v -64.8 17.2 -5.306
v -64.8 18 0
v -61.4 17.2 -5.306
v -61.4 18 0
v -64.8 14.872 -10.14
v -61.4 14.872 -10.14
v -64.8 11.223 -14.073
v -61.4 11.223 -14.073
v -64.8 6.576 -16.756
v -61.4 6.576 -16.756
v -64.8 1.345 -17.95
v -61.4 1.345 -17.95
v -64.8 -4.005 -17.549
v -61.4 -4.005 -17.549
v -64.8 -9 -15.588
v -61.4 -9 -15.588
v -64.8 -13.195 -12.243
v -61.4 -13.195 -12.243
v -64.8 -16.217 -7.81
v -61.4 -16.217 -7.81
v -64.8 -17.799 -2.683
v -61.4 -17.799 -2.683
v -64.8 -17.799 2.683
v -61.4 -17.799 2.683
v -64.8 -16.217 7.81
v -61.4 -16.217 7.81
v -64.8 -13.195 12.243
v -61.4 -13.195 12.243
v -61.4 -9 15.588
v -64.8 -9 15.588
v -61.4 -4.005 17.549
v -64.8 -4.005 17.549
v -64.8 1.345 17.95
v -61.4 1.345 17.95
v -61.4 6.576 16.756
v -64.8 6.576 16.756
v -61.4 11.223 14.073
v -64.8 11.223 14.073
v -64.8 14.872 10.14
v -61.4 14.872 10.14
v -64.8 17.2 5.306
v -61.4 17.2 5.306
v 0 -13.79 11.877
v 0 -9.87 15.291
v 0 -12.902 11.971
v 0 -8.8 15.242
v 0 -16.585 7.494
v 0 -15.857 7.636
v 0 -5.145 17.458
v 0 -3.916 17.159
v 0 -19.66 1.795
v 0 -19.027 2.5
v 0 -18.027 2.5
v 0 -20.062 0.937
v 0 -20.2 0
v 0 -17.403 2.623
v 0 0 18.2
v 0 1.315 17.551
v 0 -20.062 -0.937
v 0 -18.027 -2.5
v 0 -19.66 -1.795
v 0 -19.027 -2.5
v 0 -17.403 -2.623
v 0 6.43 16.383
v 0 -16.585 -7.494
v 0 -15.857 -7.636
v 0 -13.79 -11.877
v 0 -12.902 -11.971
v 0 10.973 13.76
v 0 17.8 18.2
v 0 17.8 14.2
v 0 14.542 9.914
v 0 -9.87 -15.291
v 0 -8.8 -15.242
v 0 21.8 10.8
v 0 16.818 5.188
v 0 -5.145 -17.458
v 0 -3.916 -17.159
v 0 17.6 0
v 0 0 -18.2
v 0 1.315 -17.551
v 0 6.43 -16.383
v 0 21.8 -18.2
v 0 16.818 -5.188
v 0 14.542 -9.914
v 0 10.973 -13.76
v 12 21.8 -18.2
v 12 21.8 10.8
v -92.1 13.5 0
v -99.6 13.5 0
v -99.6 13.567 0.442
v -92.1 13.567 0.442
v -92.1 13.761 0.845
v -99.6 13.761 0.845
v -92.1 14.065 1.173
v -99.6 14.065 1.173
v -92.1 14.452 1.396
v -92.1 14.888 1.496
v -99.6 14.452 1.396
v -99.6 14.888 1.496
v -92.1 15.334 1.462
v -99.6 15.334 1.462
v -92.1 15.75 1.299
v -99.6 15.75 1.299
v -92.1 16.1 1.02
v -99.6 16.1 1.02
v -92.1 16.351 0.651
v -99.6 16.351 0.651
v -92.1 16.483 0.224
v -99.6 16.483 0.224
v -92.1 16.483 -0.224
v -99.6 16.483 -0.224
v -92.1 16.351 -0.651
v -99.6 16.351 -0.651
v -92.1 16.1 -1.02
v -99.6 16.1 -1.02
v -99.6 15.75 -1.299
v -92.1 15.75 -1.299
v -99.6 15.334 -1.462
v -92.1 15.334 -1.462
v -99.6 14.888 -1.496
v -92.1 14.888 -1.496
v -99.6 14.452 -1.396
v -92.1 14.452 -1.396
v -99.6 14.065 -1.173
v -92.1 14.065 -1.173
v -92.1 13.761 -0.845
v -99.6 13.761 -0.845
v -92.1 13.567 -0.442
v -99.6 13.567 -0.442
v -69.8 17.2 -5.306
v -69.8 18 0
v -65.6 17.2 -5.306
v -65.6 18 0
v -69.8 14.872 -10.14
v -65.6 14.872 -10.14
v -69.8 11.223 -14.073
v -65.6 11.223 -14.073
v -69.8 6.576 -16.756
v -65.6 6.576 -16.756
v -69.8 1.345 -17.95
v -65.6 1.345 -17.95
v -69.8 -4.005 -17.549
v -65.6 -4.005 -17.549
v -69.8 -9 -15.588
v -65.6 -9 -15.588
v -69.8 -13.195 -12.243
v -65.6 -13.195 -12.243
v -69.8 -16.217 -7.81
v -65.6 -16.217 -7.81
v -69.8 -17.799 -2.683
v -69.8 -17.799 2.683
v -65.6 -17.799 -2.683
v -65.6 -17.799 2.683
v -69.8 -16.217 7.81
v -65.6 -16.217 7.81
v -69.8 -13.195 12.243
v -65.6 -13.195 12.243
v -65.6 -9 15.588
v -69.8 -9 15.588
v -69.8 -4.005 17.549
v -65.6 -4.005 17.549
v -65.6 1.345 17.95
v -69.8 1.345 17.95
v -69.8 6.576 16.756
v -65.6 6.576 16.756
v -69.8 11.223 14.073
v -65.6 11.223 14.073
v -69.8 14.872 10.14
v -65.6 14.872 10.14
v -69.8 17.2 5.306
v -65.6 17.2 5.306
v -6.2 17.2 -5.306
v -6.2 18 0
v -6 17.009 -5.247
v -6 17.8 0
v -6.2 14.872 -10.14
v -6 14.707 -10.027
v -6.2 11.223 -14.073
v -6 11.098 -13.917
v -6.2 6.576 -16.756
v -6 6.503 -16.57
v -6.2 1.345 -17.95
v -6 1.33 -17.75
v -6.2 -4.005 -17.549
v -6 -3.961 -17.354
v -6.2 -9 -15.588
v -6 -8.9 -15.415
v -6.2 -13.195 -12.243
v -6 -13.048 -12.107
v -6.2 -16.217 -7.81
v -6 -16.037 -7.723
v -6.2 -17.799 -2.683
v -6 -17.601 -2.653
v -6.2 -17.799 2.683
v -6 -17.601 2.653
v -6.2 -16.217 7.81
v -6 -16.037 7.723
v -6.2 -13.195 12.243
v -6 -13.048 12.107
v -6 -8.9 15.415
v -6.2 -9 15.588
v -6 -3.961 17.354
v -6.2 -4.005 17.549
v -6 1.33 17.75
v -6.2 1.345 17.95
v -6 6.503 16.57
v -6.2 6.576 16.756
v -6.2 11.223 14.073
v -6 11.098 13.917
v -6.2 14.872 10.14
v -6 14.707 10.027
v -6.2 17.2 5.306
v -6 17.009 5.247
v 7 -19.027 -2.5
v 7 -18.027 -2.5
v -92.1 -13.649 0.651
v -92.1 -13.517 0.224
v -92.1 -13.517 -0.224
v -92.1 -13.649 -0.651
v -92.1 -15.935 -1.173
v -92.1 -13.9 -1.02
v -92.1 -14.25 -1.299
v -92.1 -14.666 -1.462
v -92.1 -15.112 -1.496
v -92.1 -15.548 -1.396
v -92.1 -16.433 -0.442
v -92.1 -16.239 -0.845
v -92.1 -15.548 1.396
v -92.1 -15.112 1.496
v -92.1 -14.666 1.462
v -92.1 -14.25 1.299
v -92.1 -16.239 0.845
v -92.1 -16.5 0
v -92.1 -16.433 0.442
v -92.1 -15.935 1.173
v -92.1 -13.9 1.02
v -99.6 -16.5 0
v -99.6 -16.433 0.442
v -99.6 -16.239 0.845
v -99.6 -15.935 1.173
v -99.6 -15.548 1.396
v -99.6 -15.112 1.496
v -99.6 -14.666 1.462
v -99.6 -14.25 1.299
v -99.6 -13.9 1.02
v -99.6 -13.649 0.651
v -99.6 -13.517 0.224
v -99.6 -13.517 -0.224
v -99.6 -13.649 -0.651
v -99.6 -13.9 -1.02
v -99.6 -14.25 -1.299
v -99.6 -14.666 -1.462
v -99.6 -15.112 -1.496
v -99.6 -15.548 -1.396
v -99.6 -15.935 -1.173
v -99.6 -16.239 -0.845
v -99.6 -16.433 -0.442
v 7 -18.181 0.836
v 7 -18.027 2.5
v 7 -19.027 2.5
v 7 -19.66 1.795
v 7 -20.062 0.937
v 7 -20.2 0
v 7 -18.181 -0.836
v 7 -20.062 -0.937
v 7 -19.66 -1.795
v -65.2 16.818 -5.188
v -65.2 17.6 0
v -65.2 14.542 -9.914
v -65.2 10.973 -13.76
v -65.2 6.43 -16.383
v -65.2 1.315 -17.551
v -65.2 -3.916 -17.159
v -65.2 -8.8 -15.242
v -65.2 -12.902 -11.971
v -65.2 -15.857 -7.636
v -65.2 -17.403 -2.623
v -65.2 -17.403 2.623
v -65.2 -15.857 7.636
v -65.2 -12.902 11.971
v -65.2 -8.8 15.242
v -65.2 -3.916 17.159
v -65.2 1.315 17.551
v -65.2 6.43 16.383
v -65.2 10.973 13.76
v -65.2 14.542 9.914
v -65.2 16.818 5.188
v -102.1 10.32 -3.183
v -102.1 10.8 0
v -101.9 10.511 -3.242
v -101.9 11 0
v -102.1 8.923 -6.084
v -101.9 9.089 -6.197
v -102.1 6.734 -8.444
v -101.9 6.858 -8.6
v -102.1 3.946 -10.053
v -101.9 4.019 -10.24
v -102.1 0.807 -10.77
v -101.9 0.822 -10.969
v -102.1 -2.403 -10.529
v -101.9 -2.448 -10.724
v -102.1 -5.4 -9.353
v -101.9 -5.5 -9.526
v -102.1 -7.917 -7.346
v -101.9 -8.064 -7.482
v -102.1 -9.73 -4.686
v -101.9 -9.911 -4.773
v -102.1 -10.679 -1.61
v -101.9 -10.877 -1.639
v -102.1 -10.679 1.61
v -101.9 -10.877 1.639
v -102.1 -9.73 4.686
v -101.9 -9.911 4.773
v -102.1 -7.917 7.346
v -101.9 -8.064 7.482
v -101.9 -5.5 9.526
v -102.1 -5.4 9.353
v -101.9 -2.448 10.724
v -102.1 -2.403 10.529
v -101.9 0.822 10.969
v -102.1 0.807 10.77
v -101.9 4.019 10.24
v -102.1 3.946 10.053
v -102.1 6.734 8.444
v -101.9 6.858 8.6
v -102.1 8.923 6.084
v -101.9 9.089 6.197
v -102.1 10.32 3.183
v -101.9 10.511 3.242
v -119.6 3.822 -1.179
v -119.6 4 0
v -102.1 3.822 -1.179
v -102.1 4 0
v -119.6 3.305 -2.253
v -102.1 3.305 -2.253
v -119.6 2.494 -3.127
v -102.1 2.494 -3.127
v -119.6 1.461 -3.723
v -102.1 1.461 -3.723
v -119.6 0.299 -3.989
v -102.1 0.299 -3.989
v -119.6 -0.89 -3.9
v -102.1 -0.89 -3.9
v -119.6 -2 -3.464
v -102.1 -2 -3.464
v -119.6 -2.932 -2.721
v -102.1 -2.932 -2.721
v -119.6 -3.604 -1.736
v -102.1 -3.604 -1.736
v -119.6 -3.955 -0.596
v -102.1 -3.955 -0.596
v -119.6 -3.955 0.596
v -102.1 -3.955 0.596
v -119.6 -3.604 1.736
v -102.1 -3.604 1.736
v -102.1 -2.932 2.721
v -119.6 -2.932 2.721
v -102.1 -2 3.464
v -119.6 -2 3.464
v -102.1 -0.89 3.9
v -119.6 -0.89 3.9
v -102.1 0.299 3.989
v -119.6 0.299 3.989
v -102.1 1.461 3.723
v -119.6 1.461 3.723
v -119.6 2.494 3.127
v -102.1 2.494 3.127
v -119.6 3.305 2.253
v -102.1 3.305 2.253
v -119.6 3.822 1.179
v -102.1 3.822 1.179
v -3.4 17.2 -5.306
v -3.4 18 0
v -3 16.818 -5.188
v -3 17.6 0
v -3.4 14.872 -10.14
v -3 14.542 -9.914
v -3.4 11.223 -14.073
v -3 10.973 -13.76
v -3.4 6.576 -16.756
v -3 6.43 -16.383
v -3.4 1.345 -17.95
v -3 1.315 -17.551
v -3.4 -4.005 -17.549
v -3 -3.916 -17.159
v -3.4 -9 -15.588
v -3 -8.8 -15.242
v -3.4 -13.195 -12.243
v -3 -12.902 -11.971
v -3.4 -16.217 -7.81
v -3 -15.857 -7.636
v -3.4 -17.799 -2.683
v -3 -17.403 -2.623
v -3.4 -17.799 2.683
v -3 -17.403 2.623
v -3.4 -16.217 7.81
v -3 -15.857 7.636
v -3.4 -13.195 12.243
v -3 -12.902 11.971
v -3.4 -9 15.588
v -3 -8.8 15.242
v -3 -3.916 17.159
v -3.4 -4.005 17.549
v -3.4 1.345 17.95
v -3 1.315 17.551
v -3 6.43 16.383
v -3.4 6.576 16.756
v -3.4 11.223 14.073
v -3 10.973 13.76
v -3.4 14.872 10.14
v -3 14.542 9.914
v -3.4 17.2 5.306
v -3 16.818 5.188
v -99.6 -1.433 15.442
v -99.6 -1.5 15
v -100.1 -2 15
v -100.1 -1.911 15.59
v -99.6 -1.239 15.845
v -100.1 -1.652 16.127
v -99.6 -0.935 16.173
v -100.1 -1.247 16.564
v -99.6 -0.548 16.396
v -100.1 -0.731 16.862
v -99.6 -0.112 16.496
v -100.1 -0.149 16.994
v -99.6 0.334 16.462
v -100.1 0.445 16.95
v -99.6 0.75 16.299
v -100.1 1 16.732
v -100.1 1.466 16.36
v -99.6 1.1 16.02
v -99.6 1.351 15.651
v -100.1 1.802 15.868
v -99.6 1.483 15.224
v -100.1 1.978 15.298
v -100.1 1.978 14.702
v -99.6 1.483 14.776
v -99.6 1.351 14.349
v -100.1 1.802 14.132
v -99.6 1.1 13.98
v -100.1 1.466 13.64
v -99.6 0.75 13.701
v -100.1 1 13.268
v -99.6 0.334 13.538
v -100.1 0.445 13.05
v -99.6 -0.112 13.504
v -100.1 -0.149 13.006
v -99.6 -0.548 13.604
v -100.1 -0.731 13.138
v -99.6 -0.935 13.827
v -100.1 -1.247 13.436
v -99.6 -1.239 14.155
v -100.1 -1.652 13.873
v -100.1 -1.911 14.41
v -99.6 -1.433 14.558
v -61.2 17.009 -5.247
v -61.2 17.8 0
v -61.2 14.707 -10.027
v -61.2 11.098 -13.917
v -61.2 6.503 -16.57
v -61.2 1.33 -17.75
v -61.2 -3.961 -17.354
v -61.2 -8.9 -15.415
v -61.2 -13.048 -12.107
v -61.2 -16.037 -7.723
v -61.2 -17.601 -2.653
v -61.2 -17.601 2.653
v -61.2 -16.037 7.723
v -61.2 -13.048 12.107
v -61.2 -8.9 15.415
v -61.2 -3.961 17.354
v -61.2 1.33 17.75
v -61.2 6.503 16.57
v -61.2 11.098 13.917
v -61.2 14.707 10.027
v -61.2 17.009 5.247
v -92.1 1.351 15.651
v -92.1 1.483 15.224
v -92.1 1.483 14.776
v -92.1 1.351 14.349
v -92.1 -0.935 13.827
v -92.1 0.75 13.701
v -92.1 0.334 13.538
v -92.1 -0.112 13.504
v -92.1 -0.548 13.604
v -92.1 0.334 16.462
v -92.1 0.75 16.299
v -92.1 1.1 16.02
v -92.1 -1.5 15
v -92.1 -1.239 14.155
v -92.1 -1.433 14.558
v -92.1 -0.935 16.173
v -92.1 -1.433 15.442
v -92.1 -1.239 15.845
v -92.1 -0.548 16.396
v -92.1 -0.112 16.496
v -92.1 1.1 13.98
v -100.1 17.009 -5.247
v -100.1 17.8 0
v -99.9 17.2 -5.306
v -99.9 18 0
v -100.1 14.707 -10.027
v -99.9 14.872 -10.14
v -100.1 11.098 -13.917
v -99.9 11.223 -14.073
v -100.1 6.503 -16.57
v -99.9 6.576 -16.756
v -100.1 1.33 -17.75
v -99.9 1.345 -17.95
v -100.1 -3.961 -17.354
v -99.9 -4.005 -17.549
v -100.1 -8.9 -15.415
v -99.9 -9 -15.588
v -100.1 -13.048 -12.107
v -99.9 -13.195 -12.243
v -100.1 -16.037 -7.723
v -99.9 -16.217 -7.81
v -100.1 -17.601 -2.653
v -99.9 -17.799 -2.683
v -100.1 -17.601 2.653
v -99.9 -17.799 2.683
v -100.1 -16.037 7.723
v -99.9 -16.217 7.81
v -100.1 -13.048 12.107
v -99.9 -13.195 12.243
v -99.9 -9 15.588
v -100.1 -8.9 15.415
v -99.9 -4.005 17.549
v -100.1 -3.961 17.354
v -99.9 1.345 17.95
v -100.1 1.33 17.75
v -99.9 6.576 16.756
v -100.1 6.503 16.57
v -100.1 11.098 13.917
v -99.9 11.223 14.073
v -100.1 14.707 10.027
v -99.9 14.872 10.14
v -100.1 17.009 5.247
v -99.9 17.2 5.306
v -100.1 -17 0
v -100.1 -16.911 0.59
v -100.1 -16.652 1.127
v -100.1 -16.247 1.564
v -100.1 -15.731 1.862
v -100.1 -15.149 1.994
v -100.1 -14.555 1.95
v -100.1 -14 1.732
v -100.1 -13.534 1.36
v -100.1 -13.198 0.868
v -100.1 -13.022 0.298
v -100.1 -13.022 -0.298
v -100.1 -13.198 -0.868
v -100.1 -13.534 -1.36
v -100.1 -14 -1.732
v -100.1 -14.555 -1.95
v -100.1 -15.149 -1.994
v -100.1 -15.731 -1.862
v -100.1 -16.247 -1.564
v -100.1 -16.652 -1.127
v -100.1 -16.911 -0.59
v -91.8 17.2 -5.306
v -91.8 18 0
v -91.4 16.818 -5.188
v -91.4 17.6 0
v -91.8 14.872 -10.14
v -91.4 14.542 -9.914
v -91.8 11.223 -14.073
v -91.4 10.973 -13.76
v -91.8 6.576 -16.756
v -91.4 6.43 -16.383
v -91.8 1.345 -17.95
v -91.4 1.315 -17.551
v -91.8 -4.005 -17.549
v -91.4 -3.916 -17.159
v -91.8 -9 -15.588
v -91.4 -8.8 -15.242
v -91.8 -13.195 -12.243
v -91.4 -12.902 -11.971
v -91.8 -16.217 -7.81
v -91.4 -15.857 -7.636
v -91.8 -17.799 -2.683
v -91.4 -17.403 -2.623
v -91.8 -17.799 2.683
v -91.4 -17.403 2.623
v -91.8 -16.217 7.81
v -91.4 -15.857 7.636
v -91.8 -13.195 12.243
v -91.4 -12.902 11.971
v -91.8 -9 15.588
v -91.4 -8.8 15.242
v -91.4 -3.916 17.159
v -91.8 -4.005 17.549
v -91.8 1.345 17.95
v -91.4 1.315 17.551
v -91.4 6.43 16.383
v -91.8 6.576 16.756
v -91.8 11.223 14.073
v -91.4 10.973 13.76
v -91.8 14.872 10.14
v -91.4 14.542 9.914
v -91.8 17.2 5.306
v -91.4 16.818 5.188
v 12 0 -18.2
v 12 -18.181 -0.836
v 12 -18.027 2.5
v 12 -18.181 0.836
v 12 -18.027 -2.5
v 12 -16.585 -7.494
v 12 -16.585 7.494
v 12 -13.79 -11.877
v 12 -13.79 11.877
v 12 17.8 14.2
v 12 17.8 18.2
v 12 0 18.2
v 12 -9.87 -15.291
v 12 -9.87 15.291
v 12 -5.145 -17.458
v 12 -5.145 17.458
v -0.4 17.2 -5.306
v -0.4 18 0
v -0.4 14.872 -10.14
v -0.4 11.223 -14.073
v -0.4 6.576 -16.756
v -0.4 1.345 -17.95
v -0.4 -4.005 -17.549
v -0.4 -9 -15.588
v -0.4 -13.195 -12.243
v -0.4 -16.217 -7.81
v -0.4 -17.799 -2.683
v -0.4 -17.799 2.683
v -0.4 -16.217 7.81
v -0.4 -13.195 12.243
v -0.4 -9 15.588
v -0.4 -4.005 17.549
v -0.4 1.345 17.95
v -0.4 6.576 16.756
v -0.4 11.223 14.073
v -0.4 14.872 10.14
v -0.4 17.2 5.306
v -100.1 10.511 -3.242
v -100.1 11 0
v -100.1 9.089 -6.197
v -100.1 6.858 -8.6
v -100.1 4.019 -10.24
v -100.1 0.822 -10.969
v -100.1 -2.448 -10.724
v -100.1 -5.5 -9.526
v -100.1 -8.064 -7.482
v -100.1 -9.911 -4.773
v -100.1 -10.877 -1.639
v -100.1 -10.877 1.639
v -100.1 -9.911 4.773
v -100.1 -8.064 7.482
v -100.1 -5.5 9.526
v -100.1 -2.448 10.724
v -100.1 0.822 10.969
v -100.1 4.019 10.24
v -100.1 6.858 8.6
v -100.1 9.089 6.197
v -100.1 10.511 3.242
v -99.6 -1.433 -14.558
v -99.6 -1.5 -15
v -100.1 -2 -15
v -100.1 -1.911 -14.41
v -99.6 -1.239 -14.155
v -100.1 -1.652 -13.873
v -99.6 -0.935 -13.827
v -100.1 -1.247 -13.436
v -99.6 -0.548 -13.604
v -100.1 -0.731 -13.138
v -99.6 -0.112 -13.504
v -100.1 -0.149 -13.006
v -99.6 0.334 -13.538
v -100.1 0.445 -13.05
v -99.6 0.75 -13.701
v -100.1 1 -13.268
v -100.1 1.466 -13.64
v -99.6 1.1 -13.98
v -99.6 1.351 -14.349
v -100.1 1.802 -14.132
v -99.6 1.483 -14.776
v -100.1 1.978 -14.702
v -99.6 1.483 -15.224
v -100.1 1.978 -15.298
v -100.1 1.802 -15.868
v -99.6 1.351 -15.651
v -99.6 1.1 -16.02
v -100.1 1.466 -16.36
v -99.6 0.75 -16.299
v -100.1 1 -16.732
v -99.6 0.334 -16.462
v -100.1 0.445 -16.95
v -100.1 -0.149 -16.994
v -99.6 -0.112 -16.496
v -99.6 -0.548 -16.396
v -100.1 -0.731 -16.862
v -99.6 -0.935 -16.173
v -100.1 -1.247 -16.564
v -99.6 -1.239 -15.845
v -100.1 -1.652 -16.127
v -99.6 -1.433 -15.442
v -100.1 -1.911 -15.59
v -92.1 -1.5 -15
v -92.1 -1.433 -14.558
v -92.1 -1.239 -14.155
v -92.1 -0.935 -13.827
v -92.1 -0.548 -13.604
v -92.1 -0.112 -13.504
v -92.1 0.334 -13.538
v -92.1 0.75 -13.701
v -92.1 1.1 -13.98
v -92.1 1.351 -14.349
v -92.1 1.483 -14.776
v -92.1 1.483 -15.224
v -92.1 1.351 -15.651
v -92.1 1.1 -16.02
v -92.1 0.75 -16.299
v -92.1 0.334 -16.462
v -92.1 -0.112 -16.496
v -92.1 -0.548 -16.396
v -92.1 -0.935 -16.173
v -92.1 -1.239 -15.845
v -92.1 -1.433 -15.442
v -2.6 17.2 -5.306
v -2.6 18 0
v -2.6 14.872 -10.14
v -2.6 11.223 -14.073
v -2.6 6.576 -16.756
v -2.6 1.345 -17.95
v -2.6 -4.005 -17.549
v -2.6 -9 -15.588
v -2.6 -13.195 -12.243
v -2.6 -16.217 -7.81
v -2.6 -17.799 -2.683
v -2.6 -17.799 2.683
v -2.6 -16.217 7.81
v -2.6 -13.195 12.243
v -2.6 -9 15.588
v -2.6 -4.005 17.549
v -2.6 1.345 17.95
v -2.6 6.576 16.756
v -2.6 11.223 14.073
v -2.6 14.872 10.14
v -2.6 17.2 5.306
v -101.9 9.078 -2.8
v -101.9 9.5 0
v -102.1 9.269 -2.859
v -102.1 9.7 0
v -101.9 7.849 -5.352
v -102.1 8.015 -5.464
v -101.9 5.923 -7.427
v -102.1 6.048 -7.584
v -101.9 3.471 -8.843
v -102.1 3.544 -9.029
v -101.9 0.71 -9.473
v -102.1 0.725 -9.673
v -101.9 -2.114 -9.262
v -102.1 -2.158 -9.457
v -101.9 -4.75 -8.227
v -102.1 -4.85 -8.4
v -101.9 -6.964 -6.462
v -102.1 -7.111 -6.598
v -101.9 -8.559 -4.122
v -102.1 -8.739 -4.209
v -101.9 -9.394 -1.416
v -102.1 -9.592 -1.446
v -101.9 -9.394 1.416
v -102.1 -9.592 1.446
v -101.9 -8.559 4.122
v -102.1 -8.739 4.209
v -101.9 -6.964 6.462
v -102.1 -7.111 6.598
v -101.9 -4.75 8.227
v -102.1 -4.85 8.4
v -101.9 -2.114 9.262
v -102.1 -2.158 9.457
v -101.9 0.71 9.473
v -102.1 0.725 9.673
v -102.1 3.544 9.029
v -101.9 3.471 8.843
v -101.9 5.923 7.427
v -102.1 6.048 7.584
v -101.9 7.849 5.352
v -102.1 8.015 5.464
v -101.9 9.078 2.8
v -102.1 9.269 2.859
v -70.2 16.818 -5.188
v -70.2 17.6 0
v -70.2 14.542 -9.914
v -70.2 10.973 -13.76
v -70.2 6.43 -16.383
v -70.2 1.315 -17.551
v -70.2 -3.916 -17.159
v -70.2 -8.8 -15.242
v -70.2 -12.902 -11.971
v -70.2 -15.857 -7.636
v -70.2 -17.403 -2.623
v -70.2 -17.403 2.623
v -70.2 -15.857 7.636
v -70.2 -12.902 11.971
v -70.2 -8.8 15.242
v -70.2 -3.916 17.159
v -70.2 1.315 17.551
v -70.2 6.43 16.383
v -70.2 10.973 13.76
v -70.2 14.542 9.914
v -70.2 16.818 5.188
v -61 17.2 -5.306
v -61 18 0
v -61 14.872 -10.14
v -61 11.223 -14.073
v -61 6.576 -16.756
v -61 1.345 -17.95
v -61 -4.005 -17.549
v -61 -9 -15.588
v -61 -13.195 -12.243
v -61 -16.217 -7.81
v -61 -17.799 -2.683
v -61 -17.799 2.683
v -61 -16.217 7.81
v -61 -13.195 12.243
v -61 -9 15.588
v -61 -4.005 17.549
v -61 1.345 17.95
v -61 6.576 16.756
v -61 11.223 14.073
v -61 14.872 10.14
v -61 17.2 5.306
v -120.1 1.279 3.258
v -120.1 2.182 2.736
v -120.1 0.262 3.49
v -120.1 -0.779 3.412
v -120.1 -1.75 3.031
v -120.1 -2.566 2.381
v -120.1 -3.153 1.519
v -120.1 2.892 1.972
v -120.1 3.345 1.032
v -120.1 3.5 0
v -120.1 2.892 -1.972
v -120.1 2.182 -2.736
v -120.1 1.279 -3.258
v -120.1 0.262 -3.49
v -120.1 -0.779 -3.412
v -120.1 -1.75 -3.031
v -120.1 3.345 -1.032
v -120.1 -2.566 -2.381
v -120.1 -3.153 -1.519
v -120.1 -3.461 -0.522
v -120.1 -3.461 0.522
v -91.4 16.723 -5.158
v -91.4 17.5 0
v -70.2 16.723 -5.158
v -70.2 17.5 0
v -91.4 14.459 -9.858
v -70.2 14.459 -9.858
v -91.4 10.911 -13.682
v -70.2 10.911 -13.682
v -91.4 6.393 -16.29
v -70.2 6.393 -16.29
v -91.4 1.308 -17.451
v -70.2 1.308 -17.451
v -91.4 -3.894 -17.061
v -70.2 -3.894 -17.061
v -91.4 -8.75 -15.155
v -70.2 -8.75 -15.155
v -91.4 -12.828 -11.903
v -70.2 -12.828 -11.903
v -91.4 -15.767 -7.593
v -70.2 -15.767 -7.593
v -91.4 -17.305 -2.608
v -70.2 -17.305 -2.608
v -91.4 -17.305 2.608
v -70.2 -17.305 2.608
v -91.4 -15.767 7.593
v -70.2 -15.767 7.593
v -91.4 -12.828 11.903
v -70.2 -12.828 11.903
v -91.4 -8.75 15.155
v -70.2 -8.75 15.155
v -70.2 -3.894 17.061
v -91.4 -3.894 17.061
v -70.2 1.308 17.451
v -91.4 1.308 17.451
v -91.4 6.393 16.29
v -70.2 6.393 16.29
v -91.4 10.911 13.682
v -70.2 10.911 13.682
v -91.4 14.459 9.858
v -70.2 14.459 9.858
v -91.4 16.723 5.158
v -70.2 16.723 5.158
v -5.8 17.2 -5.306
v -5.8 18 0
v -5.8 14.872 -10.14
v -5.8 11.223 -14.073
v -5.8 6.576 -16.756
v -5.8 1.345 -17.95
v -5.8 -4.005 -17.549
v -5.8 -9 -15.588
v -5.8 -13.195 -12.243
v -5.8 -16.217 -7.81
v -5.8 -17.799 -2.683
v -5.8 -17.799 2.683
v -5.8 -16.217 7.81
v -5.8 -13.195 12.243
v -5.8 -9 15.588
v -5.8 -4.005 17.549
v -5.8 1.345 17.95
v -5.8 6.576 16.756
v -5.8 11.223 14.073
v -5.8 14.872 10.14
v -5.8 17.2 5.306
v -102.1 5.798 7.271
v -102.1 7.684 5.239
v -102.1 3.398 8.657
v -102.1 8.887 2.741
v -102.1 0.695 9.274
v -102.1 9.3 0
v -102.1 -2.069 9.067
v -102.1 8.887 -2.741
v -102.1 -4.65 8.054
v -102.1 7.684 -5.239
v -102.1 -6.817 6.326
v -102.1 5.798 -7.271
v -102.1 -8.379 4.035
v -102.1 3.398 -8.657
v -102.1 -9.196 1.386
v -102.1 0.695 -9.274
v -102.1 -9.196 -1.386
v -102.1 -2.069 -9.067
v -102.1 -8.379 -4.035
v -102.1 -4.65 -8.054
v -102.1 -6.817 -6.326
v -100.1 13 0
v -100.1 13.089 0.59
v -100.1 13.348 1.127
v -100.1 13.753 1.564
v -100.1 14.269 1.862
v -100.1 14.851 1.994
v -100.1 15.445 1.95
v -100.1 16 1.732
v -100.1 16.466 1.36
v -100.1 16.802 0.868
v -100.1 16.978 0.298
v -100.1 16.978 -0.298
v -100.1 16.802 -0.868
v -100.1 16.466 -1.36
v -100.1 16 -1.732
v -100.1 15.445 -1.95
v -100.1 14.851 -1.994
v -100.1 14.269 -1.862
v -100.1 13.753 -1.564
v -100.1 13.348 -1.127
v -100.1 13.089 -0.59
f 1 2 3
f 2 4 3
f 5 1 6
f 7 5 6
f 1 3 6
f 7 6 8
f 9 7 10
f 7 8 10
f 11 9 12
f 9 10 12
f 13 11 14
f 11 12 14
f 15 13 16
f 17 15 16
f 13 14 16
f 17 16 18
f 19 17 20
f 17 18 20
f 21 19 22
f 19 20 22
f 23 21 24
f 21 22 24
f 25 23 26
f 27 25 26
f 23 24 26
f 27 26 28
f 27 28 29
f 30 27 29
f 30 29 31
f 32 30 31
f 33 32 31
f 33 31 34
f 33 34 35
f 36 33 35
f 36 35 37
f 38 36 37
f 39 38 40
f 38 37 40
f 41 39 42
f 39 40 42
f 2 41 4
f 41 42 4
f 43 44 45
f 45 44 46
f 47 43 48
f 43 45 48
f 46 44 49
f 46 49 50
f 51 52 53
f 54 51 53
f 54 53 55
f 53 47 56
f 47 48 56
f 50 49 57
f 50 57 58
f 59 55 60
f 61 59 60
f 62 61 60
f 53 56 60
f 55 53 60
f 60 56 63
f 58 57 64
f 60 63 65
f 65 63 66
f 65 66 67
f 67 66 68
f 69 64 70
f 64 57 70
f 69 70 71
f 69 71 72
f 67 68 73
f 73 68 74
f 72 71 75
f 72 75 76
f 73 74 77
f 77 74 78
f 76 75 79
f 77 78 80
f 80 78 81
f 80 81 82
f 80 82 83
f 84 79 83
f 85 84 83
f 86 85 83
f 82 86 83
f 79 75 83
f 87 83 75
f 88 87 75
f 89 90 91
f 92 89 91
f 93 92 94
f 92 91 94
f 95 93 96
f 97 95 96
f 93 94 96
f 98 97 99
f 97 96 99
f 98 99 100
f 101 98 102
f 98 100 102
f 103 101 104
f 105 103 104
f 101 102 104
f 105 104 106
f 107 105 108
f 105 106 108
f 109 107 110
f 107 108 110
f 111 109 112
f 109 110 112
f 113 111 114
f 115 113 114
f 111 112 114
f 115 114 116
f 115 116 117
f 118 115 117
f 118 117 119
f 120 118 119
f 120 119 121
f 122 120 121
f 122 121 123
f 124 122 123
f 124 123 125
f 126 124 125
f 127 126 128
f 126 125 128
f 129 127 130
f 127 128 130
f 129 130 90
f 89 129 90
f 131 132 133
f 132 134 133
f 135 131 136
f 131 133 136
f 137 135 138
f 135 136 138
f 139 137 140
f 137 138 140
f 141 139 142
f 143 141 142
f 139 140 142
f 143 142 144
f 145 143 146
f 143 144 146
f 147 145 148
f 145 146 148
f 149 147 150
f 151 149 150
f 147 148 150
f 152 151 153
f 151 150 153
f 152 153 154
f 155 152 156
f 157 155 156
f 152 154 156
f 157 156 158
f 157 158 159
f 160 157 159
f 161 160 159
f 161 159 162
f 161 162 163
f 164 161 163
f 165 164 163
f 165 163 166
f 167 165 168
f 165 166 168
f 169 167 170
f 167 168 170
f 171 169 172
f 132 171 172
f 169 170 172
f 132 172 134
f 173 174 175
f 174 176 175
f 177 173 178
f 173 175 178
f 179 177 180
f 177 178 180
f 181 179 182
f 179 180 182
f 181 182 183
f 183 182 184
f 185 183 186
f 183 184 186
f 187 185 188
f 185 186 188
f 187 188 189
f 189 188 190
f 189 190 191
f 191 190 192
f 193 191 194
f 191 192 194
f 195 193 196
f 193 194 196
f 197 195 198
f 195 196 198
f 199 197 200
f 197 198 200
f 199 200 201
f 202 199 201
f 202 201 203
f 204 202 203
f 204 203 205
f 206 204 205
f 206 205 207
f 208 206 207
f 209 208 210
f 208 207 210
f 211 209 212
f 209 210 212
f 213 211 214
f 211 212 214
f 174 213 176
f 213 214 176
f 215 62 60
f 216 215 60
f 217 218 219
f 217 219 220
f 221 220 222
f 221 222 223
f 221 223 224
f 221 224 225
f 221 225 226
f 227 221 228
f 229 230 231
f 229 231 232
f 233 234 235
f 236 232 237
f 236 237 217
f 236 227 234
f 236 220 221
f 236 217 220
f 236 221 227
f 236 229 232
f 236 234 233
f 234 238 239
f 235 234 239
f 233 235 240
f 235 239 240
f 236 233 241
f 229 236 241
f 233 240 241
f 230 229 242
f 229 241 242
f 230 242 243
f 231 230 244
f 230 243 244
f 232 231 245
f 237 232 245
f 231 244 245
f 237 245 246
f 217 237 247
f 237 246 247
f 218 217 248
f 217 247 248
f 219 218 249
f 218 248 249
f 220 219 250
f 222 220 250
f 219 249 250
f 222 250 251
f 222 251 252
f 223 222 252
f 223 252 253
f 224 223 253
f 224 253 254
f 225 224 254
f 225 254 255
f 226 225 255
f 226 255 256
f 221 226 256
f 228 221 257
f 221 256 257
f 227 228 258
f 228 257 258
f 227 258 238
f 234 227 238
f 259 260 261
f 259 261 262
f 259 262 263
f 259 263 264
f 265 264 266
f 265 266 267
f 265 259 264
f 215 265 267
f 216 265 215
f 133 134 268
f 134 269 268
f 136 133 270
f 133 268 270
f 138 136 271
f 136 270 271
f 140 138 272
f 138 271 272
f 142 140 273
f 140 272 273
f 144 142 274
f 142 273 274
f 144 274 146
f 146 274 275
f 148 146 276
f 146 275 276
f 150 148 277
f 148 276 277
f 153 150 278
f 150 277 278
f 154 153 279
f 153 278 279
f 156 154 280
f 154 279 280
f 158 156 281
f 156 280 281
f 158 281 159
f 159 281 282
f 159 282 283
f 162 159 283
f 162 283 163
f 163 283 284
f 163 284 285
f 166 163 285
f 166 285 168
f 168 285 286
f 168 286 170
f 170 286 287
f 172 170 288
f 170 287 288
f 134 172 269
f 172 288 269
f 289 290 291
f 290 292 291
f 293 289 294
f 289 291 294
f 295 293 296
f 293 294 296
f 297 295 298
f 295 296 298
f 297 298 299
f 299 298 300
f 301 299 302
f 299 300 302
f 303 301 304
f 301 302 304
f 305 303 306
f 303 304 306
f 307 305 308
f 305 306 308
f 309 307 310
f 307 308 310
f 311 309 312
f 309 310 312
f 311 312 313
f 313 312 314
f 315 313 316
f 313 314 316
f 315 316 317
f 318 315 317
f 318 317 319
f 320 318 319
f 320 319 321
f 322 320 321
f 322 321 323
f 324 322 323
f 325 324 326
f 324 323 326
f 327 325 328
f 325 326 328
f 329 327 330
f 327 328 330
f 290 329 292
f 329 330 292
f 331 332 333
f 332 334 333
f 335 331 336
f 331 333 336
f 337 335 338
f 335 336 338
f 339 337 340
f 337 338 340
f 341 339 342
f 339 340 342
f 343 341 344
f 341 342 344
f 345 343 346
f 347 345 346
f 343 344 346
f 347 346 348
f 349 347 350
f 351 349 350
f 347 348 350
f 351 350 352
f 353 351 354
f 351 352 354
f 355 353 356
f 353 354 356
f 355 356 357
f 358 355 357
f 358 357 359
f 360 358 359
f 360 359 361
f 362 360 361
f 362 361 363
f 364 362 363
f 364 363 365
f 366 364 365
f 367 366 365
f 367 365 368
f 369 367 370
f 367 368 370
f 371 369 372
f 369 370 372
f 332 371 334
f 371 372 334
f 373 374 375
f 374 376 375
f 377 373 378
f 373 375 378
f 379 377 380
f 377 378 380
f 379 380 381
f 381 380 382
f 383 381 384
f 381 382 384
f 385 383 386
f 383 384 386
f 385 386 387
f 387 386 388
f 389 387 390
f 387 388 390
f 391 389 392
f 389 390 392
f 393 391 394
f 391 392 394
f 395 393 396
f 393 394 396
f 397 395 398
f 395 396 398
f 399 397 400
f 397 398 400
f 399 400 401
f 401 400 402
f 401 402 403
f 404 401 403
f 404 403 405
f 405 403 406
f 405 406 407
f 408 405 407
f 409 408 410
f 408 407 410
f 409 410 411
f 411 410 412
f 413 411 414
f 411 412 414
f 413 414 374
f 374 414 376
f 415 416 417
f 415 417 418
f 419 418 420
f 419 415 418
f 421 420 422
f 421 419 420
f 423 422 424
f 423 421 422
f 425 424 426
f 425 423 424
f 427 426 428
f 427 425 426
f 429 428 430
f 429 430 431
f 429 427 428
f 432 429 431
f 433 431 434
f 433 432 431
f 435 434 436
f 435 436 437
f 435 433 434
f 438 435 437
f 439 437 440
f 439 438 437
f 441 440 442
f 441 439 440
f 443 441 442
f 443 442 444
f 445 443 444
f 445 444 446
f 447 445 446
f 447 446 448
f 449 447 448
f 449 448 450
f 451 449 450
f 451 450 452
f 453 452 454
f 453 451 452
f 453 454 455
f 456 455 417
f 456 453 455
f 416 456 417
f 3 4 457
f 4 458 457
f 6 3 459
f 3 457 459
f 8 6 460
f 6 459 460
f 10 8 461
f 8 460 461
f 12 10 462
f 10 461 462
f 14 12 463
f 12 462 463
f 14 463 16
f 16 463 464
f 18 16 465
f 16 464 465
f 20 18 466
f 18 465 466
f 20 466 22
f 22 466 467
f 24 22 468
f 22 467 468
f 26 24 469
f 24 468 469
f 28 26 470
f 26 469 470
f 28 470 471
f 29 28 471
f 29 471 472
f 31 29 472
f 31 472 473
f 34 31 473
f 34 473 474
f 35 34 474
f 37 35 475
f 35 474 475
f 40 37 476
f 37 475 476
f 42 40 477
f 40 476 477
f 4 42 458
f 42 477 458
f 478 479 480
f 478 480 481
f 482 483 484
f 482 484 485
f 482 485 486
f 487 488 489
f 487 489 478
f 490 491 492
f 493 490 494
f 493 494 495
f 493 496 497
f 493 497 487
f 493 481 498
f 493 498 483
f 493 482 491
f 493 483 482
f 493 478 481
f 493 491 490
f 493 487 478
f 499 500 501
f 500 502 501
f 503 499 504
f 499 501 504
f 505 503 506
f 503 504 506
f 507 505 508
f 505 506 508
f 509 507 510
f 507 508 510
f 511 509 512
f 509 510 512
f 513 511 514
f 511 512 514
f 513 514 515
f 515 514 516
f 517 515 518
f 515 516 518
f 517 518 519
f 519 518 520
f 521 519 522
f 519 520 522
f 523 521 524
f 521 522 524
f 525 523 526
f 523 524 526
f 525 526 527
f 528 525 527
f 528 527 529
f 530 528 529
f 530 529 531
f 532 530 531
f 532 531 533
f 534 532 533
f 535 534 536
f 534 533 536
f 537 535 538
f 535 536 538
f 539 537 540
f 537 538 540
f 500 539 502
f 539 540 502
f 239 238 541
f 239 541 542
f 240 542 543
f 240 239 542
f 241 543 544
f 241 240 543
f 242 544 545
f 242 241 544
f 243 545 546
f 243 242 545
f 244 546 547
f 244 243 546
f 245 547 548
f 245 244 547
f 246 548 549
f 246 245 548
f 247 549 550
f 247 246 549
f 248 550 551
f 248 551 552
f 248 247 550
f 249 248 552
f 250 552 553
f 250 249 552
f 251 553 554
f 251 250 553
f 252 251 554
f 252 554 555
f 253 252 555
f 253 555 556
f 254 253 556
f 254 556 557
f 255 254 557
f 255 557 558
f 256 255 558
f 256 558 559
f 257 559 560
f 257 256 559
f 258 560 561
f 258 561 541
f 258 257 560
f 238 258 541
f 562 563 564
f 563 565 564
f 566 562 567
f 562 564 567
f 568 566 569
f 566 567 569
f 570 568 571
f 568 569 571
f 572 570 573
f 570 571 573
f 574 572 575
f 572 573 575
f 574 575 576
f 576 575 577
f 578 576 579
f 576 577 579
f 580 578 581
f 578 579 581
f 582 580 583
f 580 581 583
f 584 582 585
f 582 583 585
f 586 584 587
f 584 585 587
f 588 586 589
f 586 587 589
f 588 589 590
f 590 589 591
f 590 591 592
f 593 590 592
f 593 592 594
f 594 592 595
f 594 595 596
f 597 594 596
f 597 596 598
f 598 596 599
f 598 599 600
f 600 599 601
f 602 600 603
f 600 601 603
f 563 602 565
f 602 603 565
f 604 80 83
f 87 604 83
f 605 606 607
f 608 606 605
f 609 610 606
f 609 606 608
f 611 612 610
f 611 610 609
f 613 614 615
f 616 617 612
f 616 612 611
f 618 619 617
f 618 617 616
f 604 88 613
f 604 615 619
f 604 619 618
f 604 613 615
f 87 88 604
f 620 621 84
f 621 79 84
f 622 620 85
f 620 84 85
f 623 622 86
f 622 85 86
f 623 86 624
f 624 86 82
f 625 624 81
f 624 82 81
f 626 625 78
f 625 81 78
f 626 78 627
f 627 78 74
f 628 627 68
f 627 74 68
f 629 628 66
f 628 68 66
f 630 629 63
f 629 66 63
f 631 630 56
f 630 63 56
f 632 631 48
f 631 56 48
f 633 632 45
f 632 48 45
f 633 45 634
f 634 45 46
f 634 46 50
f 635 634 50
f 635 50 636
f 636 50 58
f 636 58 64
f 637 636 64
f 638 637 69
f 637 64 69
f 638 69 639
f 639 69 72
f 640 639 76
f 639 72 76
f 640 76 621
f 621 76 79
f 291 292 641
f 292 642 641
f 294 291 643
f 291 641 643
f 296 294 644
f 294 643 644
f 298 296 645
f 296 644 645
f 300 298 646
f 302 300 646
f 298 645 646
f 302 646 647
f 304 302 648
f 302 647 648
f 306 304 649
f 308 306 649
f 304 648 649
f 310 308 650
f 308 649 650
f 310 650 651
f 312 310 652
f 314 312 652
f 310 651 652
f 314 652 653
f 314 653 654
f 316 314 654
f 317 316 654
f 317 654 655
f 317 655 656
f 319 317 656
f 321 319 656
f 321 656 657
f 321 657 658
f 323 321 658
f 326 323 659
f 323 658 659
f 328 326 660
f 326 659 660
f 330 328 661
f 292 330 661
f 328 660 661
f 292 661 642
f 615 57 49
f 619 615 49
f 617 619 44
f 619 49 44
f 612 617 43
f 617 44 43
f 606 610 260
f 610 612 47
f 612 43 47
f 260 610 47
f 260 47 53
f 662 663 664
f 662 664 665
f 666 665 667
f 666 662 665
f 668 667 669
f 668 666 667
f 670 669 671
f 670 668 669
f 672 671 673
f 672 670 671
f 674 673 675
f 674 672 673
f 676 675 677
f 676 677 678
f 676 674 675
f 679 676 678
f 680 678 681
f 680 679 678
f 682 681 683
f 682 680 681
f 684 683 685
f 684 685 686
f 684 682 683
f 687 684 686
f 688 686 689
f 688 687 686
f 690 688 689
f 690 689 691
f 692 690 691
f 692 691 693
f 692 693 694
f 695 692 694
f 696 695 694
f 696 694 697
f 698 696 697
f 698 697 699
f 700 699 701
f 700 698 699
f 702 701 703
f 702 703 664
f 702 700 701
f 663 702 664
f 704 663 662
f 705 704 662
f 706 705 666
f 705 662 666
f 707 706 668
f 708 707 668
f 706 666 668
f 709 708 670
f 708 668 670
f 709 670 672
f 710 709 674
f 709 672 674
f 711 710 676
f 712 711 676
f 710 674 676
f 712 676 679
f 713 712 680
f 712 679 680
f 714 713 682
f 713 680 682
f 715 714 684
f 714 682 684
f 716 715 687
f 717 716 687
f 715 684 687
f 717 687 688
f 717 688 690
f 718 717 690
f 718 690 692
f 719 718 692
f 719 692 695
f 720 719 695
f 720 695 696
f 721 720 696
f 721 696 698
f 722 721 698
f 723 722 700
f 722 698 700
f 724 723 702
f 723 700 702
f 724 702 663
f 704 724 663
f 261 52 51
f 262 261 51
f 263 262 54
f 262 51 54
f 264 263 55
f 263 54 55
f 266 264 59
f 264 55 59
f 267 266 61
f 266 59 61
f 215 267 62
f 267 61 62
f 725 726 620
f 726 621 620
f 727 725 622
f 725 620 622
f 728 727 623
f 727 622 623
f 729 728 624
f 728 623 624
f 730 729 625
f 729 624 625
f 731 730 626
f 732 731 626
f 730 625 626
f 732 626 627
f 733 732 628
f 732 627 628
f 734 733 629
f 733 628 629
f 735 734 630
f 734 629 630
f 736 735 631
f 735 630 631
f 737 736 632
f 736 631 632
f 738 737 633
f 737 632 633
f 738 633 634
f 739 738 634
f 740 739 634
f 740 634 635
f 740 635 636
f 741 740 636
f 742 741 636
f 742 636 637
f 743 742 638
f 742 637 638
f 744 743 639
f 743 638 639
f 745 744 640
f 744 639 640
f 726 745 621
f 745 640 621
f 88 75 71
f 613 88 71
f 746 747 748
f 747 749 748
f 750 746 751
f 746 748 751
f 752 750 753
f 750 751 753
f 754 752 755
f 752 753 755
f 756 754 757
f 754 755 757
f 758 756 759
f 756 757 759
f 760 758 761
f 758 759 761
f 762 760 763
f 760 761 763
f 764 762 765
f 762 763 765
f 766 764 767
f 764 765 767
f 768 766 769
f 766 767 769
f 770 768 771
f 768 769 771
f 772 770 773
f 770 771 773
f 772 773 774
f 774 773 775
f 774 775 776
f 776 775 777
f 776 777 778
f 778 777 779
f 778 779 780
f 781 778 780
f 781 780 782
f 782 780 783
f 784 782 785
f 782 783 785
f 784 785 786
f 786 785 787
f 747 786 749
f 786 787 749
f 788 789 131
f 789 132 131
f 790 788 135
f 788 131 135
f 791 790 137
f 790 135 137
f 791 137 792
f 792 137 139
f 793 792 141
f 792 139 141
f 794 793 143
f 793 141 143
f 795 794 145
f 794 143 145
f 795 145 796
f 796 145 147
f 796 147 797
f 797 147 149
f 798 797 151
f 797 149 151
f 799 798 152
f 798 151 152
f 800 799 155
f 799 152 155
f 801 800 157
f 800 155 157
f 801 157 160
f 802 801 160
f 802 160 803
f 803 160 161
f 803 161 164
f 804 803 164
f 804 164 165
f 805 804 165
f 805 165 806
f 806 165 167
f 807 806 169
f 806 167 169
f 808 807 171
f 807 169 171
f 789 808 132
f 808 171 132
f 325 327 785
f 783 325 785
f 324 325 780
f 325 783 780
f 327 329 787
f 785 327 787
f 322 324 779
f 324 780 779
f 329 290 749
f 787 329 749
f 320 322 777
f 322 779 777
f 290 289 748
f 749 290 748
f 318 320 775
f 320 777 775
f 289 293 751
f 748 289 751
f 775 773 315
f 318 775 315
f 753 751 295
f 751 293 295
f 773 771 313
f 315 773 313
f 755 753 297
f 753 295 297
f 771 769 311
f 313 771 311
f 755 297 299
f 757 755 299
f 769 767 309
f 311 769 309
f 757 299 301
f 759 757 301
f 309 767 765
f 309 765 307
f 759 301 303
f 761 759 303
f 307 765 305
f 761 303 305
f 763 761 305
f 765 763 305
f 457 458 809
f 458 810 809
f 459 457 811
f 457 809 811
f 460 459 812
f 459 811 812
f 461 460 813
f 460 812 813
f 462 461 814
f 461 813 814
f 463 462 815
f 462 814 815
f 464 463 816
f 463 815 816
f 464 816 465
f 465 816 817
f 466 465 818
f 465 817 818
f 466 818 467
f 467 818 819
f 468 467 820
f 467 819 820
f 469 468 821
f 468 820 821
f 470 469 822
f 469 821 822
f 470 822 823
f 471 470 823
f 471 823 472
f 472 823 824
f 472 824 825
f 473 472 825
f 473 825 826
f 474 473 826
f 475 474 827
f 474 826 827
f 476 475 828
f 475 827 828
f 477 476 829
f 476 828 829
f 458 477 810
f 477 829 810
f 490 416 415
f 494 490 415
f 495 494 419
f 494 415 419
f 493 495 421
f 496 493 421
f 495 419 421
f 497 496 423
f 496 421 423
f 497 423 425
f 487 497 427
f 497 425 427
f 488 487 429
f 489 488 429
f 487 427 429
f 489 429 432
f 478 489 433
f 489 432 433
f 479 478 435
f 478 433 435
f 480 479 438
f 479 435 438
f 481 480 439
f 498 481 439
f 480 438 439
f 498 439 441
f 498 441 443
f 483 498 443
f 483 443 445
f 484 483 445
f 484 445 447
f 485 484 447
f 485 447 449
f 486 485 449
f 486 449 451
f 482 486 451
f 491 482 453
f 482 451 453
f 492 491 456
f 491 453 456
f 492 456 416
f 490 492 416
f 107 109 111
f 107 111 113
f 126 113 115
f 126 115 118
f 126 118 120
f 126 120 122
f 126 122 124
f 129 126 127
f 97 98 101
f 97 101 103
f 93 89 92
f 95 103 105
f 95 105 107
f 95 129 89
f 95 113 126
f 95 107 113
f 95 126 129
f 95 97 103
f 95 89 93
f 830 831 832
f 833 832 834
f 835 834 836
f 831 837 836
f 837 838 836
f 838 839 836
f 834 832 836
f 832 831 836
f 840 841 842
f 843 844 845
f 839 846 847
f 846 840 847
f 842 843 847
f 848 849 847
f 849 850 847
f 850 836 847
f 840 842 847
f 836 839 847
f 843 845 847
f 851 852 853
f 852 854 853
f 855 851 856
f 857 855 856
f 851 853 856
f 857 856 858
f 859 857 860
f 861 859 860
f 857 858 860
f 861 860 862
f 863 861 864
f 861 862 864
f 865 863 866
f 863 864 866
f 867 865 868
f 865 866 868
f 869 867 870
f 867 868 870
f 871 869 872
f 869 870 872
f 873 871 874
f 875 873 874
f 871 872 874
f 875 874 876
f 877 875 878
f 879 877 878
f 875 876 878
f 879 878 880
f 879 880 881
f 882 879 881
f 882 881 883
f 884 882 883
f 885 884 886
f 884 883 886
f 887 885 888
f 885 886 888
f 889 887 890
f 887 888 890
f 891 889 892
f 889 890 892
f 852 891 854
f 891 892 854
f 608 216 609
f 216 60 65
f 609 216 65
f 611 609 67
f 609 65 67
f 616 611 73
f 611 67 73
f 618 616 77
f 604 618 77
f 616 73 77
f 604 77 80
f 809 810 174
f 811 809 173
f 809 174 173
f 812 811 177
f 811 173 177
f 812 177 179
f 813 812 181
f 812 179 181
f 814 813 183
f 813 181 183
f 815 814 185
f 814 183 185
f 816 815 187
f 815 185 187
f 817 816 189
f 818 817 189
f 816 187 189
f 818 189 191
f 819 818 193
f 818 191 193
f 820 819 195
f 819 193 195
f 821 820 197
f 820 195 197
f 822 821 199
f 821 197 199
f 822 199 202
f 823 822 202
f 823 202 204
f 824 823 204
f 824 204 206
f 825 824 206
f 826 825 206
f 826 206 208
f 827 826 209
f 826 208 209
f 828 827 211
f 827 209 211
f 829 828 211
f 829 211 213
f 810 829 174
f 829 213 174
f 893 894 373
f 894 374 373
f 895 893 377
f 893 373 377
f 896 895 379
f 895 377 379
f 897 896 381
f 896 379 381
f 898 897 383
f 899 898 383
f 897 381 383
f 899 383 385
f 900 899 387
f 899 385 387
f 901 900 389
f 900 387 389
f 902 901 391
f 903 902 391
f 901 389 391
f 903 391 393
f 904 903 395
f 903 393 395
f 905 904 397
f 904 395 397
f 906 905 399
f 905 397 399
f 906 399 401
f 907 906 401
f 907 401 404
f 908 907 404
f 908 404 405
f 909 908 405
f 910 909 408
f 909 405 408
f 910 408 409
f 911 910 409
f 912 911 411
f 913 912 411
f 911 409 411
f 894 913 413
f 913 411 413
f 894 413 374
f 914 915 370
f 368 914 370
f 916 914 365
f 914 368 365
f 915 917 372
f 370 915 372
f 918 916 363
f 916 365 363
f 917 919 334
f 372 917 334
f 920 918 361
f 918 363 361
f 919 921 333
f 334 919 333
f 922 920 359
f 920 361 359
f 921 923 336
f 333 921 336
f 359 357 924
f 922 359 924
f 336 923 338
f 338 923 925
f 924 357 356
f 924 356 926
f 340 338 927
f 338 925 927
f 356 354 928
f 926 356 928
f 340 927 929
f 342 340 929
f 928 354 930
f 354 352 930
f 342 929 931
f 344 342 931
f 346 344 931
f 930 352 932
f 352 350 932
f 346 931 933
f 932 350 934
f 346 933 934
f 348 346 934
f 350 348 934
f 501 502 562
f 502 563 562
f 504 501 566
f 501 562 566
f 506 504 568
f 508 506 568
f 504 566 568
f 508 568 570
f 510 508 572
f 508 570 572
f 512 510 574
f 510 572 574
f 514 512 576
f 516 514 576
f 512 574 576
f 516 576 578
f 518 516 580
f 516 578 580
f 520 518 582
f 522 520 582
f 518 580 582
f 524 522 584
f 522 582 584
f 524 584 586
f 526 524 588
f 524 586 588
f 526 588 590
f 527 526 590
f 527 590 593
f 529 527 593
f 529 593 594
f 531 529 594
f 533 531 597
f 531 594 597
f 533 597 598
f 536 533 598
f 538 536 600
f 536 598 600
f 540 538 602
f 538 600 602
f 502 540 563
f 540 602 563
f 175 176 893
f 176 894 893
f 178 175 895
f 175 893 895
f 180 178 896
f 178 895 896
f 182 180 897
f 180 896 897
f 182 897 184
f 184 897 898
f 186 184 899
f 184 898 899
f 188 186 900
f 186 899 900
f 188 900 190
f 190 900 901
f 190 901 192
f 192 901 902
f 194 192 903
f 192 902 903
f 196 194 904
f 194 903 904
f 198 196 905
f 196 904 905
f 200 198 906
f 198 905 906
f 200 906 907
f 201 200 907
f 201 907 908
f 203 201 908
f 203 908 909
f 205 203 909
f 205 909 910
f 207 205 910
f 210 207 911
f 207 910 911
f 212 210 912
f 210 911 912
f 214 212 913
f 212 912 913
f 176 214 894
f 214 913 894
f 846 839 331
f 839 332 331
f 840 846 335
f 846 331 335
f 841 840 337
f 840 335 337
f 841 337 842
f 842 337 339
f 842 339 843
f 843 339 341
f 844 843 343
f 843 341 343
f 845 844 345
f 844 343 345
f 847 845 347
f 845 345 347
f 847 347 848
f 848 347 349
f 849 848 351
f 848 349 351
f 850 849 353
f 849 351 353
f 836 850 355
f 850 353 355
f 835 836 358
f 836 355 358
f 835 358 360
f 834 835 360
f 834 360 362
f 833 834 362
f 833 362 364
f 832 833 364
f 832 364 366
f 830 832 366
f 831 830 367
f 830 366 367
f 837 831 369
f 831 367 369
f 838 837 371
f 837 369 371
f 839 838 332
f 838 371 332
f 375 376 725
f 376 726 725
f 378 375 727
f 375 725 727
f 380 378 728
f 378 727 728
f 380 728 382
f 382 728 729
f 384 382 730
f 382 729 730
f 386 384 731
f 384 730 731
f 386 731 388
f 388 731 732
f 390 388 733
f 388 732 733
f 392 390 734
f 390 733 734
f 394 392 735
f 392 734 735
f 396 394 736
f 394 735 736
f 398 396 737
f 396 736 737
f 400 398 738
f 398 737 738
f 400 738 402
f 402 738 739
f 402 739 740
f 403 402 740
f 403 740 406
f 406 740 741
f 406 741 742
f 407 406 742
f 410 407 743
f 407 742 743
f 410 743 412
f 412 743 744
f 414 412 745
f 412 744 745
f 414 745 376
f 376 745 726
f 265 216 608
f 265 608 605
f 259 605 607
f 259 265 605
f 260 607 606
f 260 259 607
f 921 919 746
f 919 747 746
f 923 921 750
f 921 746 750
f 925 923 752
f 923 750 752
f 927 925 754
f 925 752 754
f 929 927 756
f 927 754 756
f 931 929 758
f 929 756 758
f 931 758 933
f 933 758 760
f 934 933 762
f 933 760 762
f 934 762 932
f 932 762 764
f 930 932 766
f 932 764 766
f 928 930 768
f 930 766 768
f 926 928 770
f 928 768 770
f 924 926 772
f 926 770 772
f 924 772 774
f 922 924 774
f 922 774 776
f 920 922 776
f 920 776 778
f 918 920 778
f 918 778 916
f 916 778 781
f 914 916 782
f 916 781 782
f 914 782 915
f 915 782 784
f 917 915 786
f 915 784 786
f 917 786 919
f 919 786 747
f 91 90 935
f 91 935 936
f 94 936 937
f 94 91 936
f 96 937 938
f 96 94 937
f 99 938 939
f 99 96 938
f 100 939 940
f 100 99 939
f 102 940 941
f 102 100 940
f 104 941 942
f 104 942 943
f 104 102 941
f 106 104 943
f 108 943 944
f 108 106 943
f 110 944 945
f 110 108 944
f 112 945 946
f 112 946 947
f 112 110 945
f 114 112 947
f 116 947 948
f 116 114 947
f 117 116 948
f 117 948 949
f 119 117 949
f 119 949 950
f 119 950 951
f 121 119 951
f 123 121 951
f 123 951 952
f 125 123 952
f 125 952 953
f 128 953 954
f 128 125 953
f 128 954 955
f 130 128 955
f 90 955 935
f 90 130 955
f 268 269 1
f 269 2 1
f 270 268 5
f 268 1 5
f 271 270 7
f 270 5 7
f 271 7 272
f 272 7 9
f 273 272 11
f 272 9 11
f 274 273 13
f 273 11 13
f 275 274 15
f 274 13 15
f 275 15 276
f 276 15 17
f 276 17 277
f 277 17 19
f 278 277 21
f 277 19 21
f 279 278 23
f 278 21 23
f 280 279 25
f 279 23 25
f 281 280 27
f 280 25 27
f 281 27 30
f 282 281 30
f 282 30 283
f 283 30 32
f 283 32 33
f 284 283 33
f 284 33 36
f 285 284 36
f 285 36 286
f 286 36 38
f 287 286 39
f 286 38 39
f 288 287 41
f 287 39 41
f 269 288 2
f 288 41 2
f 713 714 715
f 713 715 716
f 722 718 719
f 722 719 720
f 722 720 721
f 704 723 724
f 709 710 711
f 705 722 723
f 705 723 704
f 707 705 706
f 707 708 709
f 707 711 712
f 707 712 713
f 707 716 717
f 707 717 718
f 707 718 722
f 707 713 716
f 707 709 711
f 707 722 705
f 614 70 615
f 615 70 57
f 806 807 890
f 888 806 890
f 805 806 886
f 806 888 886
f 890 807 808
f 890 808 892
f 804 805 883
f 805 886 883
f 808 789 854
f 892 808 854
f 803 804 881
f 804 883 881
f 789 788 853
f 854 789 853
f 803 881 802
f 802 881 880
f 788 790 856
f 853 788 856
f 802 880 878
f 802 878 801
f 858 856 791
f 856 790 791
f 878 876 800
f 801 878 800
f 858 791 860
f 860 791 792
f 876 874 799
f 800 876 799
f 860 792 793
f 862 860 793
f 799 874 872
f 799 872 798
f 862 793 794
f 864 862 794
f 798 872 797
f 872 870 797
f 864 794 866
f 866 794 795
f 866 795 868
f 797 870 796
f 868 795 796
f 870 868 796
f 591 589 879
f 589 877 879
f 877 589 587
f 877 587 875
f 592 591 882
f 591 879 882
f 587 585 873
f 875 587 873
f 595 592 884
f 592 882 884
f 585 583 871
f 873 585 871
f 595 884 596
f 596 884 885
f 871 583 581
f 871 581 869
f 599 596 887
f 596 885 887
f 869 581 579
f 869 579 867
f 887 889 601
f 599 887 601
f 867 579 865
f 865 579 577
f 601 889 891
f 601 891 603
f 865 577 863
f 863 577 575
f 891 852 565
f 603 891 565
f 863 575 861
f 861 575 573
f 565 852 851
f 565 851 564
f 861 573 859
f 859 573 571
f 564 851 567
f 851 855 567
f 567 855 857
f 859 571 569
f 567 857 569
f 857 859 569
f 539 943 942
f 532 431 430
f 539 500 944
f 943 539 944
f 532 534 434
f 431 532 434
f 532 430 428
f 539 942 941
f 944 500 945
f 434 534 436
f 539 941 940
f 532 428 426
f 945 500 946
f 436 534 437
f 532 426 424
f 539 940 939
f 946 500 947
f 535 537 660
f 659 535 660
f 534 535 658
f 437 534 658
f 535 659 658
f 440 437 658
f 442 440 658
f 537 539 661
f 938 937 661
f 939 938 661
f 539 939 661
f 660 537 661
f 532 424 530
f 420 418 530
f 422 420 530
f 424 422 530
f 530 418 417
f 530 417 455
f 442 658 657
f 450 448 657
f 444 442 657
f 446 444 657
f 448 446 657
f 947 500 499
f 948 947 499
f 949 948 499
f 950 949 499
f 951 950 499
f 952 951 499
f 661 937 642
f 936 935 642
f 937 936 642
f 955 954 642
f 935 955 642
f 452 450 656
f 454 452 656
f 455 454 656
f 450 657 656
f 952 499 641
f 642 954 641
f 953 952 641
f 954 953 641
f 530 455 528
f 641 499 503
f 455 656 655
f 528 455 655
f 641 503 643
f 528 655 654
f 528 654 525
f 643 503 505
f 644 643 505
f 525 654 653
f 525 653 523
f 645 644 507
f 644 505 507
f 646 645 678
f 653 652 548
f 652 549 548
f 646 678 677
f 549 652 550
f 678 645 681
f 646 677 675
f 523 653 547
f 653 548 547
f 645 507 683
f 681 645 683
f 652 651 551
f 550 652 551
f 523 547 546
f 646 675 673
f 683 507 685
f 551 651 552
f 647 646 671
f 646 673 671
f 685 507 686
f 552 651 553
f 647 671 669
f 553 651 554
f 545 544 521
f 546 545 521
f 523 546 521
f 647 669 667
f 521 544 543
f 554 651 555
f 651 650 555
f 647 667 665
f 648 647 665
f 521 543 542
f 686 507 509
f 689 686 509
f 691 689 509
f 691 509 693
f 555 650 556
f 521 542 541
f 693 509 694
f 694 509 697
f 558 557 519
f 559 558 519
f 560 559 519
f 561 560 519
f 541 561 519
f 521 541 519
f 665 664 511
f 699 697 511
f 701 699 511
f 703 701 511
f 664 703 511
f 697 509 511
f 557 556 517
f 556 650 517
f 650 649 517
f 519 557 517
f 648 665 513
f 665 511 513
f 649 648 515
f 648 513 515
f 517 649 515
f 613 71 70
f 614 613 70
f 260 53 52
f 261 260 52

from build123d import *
from build123d.topology import SkipClean

# Parameters (mm, degrees)
SKETCH2_R           = 1.5
CUT_EXTRUDE1_DEPTH  = 8
CHAMFER1_SIZE       = 0.5
BOSS_EXTRUDE1_DEPTH = 12
CUT_EXTRUDE2_START  = -5
CUT_EXTRUDE2_DEPTH  = 5


with BuildPart() as part:
    # Sketch1 → Revolve1 (revolve)
    with BuildSketch(Plane.XY):
        Polygon((-120.1, 0), (-120.1, 3.5), (-119.6, 4), (-102.1, 4), (-102.1, 9.3), (-101.9, 9.5), (-102.1, 9.7), (-102.1, 10.8), (-101.9, 11), (-100.1, 11), (-100.1, 17.8), (-99.9, 18), (-91.8, 18), (-91.4, 17.6), (-91.4, 17.5), (-70.2, 17.5), (-70.2, 17.6), (-69.8, 18), (-65.6, 18), (-65.2, 17.6), (-64.8, 18), (-61.4, 18), (-61.2, 17.8), (-61, 18), (-6.2, 18), (-6, 17.8), (-5.8, 18), (-3.4, 18), (-3, 17.6), (-2.6, 18), (-0.4, 18), (0, 17.6), (0, 0), align=None)
    revolve(axis=Axis((0, 0, 0), (-1, 0, 0)))

    # Sketch2 → Cut-Extrude1 (cut)
    with BuildSketch(Plane.ZY.offset(100.1)):
        with Locations(Location((-15, 0, 0), (0, 0, 270))):
            Circle(SKETCH2_R)
        with Locations(Location((0, 15, 0), (0, 0, 270))):
            Circle(SKETCH2_R)
        with Locations(Location((15, 0, 0), (0, 0, 270))):
            Circle(SKETCH2_R)
        with Locations(Location((0, -15, 0), (0, 0, 270))):
            Circle(SKETCH2_R)
    extrude(amount=-CUT_EXTRUDE1_DEPTH, mode=Mode.SUBTRACT)

    # Chamfer1
    chamfer1_edges = [part.edges().sort_by_distance(p)[0] for p in [
        (-100.1, 1.5, -15),
        (-100.1, 16.5, 0),
        (-100.1, 1.5, 15),
        (-100.1, -13.5, 0),
    ]]
    chamfer(chamfer1_edges, length=CHAMFER1_SIZE)

    # Sketch3 → Boss-Extrude1 (add)
    with BuildSketch(Plane(origin=(0, 0, 0), x_dir=(0, 0, -1), z_dir=(1, 0, 0))):
        with BuildLine():
            Line((18.2, 21.8), (-10.8, 21.8))
            Line((-10.8, 21.8), (-14.2, 17.8))
            Line((-14.2, 17.8), (-18.2, 17.8))
            Line((-18.2, 17.8), (-18.2, 0))
            ThreePointArc((-18.2, 0), (-13.72479508, -11.952823934), (-2.5, -18.027479025))
            Line((-2.5, -18.027479025), (-2.5, -19.027479025))
            ThreePointArc((-2.5, -19.027479025), (0, -20.2), (2.5, -19.027479025))
            Line((2.5, -19.027479025), (2.5, -18.027479025))
            ThreePointArc((2.5, -18.027479025), (13.72479508, -11.952823934), (18.2, 0))
            Line((18.2, 0), (18.2, 21.8))
        make_face()
    extrude(amount=BOSS_EXTRUDE1_DEPTH)

    # Sketch4 → Cut-Extrude2 (cut)
    with SkipClean():  # the faces are left unmerged after this step: merging them gives an invalid solid
        with BuildSketch(Plane(origin=(12, 0, 0), x_dir=(0, 0, -1), z_dir=(1, 0, 0)).offset(CUT_EXTRUDE2_START)):
            with BuildLine():
                Line((2.5, -19.027479025), (2.5, -18.027479025))
                ThreePointArc((2.5, -18.027479025), (0, -18.2), (-2.5, -18.027479025))
                Line((-2.5, -18.027479025), (-2.5, -19.027479025))
                ThreePointArc((-2.5, -19.027479025), (0, -20.2), (2.5, -19.027479025))
            make_face()
        extrude(amount=CUT_EXTRUDE2_DEPTH, mode=Mode.SUBTRACT)


solid = part.part
